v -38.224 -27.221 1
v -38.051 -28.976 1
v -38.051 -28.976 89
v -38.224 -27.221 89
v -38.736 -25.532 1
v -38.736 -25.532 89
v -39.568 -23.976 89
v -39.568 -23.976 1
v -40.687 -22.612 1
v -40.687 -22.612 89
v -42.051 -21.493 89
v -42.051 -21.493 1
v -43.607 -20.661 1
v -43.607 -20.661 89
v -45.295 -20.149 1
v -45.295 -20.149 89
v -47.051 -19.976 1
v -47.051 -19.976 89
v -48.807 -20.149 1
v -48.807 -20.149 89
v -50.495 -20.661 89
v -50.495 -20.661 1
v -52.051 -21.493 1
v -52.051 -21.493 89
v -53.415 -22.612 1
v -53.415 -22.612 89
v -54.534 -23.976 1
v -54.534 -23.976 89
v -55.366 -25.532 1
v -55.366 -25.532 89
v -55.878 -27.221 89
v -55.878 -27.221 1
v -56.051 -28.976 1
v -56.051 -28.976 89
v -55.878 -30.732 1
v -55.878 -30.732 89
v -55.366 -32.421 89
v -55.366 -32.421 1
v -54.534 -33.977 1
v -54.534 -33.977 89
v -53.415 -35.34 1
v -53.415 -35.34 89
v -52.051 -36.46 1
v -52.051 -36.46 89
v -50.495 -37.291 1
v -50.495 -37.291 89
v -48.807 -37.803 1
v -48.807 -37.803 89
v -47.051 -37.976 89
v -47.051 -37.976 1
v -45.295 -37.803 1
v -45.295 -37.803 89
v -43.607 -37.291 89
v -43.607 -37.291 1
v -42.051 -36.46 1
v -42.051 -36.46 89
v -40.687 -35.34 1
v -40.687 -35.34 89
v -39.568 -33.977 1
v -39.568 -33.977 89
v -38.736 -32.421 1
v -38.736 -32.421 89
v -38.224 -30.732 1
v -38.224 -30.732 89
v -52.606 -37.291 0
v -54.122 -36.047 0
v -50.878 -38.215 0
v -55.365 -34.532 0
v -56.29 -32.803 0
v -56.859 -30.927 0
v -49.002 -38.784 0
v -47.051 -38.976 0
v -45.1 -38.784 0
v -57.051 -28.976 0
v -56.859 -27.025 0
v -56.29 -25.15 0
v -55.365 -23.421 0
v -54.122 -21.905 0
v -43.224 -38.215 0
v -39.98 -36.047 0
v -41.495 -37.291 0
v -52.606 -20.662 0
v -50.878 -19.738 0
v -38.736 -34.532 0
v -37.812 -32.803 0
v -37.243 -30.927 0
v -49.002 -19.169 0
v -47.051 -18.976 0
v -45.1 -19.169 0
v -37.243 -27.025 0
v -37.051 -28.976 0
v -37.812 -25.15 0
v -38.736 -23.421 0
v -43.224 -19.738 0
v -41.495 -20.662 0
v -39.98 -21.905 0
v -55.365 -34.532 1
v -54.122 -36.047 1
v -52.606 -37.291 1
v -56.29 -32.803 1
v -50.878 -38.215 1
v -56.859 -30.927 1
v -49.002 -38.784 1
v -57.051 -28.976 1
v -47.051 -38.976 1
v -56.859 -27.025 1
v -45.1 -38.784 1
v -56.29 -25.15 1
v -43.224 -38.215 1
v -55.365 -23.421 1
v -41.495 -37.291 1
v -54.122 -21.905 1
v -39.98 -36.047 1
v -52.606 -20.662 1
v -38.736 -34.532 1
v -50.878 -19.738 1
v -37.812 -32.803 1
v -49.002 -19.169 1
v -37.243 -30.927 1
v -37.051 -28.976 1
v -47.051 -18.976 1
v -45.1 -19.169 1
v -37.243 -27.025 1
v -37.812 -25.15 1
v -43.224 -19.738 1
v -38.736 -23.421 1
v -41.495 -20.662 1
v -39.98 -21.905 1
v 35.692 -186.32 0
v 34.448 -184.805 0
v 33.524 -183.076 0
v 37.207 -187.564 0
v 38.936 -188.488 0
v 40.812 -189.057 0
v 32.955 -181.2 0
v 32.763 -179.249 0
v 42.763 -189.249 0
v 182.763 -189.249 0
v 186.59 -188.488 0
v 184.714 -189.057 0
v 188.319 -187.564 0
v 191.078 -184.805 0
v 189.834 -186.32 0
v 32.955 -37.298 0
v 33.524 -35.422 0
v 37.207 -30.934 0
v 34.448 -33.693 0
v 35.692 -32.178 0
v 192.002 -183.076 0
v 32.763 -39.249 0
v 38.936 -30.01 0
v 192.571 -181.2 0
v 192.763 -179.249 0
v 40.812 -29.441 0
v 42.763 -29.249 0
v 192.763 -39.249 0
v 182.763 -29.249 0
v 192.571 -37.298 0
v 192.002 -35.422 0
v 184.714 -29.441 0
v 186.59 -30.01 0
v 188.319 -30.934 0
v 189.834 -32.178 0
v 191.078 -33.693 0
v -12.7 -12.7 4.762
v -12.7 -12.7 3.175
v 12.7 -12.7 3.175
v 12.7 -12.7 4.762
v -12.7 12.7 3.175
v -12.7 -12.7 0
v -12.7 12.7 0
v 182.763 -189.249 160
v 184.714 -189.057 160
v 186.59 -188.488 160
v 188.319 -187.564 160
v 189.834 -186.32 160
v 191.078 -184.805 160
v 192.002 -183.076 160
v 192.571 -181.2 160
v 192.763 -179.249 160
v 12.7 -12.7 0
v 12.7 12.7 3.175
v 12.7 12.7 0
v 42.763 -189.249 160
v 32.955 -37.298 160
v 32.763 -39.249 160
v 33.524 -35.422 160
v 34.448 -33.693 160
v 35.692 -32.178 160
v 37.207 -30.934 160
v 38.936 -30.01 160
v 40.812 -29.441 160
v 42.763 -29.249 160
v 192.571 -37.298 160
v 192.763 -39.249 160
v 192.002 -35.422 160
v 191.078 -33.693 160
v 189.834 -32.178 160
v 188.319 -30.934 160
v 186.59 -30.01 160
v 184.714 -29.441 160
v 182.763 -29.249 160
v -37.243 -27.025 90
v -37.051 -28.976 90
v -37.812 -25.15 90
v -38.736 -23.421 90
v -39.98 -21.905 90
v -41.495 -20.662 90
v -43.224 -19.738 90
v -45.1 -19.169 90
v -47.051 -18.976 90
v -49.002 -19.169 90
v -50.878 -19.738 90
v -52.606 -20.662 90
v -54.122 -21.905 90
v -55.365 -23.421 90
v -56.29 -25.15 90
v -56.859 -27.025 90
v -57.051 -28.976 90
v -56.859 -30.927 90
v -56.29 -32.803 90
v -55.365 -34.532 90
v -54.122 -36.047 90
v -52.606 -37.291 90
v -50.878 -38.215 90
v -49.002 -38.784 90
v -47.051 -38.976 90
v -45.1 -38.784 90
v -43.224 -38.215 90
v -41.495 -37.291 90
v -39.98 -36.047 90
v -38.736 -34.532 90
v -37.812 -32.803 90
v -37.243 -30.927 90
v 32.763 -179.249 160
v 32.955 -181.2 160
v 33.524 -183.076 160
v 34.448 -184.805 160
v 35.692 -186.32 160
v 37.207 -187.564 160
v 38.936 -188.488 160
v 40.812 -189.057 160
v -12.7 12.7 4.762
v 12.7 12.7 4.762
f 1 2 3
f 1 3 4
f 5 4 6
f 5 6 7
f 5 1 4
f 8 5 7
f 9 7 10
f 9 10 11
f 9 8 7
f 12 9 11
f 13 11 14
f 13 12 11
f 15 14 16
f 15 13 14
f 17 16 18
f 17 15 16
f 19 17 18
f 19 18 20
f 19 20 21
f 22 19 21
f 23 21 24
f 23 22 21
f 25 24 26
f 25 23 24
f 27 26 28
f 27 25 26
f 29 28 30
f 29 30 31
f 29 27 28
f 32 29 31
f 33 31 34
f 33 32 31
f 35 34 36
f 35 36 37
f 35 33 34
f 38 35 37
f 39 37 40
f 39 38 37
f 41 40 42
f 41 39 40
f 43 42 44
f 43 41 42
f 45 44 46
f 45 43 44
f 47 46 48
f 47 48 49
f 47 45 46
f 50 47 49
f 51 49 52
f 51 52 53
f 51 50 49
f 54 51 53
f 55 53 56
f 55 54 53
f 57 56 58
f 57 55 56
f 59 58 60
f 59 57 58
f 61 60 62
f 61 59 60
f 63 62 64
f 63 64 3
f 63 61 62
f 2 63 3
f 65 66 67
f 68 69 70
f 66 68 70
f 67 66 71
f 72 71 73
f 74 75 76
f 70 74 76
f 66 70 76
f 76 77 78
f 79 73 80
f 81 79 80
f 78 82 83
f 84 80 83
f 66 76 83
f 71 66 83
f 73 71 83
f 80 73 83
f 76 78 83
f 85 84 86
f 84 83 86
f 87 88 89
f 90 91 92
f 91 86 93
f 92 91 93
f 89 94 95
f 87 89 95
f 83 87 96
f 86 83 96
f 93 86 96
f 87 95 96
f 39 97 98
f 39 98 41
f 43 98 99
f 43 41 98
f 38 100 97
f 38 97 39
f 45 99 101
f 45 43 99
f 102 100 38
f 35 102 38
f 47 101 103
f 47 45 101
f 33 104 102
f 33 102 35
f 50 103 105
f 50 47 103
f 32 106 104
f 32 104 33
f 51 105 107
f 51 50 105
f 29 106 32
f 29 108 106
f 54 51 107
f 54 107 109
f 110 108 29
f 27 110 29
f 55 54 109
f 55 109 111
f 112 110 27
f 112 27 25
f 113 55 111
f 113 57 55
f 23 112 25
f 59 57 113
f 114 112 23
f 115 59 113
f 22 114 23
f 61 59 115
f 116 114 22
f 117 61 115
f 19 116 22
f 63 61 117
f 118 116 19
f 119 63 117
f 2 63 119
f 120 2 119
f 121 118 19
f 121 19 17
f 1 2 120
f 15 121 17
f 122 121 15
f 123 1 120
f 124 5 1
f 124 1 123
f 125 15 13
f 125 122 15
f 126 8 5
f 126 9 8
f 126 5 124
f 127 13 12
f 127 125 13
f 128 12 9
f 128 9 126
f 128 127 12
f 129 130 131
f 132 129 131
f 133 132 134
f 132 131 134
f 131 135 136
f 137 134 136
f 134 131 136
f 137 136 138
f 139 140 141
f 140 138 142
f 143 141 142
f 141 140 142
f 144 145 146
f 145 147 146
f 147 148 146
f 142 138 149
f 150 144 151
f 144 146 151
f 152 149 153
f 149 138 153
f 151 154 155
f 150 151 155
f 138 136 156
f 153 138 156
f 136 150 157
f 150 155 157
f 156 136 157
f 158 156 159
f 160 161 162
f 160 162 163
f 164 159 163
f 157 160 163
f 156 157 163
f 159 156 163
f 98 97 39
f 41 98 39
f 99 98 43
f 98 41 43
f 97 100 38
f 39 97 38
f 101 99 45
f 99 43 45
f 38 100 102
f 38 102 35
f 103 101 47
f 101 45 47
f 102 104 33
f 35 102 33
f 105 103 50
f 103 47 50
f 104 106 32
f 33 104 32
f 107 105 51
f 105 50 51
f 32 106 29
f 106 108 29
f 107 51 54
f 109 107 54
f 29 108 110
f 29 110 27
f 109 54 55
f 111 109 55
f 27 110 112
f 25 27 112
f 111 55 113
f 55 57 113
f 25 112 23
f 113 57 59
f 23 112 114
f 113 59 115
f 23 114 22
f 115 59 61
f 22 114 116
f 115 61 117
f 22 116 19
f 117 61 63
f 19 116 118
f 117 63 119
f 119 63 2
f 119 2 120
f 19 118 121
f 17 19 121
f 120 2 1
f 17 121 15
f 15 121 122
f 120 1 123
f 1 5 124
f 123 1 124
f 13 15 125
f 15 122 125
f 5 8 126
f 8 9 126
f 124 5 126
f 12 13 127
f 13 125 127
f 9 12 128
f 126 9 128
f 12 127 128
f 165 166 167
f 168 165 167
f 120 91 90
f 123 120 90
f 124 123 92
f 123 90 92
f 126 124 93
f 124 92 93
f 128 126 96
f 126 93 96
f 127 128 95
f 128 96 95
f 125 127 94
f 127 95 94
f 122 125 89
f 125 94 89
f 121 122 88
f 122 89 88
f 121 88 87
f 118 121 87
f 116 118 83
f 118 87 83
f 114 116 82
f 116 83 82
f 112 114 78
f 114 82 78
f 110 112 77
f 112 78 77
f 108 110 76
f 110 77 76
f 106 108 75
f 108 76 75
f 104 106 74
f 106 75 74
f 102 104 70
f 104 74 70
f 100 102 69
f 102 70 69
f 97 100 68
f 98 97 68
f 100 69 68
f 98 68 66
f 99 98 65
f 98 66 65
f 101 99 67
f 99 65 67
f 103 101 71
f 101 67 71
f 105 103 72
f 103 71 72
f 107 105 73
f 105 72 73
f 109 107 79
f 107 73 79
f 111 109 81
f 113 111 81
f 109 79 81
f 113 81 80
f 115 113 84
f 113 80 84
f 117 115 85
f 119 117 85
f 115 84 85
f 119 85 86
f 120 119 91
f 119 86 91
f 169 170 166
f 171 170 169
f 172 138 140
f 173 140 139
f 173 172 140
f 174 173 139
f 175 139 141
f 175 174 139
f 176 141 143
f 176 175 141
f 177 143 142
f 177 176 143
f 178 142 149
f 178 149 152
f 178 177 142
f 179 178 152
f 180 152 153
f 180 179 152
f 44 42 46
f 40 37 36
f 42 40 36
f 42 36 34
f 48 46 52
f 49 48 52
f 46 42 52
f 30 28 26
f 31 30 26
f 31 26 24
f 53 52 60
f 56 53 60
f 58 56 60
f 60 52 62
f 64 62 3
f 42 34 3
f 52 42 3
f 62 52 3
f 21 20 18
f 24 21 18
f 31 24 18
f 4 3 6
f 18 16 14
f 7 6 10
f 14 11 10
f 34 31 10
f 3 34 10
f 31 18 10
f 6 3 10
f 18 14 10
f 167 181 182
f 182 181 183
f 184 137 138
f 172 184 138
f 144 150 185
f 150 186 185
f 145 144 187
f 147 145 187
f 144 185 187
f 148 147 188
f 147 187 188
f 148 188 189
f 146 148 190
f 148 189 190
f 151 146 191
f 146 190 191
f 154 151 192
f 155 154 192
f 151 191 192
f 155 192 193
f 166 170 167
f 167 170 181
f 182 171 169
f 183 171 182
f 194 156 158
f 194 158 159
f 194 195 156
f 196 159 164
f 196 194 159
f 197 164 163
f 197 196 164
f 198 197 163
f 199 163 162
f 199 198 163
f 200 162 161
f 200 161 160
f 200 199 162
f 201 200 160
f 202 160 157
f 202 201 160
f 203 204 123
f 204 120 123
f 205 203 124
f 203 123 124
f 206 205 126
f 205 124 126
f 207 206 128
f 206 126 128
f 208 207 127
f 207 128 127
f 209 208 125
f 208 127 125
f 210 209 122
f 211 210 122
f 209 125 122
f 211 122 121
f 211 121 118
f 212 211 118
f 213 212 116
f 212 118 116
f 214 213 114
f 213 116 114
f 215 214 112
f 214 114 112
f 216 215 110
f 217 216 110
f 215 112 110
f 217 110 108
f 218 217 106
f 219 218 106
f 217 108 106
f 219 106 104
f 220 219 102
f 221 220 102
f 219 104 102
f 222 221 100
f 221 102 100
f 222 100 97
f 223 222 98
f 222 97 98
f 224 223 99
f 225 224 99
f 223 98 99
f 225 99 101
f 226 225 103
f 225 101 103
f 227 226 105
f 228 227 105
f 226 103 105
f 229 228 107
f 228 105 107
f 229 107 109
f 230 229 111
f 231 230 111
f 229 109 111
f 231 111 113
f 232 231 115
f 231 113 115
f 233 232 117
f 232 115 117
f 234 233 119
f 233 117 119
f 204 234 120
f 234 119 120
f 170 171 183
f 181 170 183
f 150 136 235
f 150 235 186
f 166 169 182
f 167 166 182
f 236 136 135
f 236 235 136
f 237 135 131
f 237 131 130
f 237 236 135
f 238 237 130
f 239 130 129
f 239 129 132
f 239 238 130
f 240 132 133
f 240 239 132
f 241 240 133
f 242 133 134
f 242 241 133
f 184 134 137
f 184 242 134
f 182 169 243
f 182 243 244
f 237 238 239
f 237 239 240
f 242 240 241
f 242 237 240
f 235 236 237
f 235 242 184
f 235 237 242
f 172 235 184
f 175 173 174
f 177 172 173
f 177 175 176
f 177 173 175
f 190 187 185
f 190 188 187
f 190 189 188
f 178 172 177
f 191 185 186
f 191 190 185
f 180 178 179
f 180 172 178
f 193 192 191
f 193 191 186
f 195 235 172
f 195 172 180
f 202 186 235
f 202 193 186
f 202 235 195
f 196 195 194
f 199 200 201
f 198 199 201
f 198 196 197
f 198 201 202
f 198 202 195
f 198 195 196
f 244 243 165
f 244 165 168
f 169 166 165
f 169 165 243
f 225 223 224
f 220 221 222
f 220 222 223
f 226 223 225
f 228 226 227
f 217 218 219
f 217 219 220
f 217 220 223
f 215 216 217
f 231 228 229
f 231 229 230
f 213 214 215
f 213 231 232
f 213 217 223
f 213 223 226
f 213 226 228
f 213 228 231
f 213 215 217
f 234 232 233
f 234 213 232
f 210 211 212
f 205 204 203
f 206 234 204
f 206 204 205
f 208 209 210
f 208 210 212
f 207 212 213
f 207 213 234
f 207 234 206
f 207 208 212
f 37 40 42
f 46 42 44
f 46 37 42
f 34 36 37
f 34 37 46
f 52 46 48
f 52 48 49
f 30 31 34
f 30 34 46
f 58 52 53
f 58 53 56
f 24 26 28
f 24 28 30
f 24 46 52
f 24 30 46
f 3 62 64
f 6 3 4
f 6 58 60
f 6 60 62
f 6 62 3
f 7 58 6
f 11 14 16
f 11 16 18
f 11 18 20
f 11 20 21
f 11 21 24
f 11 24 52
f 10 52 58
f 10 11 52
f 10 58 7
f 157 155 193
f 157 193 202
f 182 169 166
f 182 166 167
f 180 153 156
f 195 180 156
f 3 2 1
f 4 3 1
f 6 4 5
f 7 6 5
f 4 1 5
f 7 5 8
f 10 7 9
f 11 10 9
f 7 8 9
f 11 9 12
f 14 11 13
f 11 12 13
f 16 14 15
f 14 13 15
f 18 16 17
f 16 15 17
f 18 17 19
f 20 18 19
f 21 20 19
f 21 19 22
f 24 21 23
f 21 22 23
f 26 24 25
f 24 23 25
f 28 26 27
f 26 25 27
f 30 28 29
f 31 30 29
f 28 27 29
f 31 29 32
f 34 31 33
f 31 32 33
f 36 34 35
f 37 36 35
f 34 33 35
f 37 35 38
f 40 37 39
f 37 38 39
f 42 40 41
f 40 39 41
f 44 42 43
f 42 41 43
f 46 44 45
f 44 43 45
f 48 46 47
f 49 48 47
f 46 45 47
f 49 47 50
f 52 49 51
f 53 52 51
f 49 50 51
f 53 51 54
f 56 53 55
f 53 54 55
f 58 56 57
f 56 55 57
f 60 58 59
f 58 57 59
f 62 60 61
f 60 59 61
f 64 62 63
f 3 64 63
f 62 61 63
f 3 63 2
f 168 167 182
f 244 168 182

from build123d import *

# Parameters (mm, degrees)
F0_W      = 25.4
F0_H      = 25.4
F1_DEPTH  = 3.175
F2_W      = 25.4
F2_H      = 25.4
F3_DEPTH  = 1.5875
F4_R      = 10
F5_DEPTH  = 1
F6_R      = 9
F7_DEPTH  = 88
F8_R      = 10
F8_R_2    = 9
F9_DEPTH  = 88
F10_R     = 10
F11_DEPTH = 1
F12_W     = 160
F12_H     = 160
F13_DEPTH = 160
F14_R     = 10


with BuildPart() as f1:
    # F0 (on Top) → F1 (new body)
    with BuildSketch(Plane.XY):
        Rectangle(F0_W, F0_H)
    extrude(amount=F1_DEPTH)


with BuildPart() as f3:
    # F2 (on face) → F3 (new body)
    with BuildSketch(Plane.XY.offset(3.175)):
        Rectangle(F2_W, F2_H)
    extrude(amount=F3_DEPTH)


with BuildPart() as f5:
    # F4 (on Top) → F5 (new body)
    with BuildSketch(Plane.XY):
        with Locations((-47.0507442951, -28.9763715118)):
            Circle(F4_R)
    extrude(amount=F5_DEPTH)

    # F6 (on face) → F7 (join)
    with BuildSketch(Plane.XY.offset(1)):
        with Locations((-47.0507442951, -28.9763715118)):
            Circle(F6_R)
    extrude(amount=F7_DEPTH)


with BuildPart() as f9:
    # F8 (on face) → F9 (new body, through all)
    with BuildSketch(Plane.XY.offset(1)):
        with Locations((-47.0507442951, -28.9763715118)):
            Circle(F8_R)
        with Locations((-47.0507442951, -28.9763715118)):
            Circle(F8_R_2, mode=Mode.SUBTRACT)
    extrude(amount=F9_DEPTH)

    # F10 (on face) → F11 (join)
    with BuildSketch(Plane.XY.offset(89)):
        with Locations((-47.0507442951, -28.9763715118)):
            Circle(F10_R)
    extrude(amount=F11_DEPTH)


with BuildPart() as f13:
    # F12 (on Top) → F13 (new body)
    with BuildSketch(Plane.XY):
        with Locations((112.7631608397, -109.2488616705)):
            Rectangle(F12_W, F12_H)
    extrude(amount=F13_DEPTH)

    # F14
    f14_edges = [f13.edges().sort_by_distance(p)[0] for p in [
        (32.763161, -189.248862, 80),
        (192.763161, -189.248862, 80),
        (192.763161, -29.248862, 80),
        (32.763161, -29.248862, 80),
    ]]
    fillet(f14_edges, radius=F14_R)


solid = Compound([f1.part, f3.part, f5.part, f9.part, f13.part])
